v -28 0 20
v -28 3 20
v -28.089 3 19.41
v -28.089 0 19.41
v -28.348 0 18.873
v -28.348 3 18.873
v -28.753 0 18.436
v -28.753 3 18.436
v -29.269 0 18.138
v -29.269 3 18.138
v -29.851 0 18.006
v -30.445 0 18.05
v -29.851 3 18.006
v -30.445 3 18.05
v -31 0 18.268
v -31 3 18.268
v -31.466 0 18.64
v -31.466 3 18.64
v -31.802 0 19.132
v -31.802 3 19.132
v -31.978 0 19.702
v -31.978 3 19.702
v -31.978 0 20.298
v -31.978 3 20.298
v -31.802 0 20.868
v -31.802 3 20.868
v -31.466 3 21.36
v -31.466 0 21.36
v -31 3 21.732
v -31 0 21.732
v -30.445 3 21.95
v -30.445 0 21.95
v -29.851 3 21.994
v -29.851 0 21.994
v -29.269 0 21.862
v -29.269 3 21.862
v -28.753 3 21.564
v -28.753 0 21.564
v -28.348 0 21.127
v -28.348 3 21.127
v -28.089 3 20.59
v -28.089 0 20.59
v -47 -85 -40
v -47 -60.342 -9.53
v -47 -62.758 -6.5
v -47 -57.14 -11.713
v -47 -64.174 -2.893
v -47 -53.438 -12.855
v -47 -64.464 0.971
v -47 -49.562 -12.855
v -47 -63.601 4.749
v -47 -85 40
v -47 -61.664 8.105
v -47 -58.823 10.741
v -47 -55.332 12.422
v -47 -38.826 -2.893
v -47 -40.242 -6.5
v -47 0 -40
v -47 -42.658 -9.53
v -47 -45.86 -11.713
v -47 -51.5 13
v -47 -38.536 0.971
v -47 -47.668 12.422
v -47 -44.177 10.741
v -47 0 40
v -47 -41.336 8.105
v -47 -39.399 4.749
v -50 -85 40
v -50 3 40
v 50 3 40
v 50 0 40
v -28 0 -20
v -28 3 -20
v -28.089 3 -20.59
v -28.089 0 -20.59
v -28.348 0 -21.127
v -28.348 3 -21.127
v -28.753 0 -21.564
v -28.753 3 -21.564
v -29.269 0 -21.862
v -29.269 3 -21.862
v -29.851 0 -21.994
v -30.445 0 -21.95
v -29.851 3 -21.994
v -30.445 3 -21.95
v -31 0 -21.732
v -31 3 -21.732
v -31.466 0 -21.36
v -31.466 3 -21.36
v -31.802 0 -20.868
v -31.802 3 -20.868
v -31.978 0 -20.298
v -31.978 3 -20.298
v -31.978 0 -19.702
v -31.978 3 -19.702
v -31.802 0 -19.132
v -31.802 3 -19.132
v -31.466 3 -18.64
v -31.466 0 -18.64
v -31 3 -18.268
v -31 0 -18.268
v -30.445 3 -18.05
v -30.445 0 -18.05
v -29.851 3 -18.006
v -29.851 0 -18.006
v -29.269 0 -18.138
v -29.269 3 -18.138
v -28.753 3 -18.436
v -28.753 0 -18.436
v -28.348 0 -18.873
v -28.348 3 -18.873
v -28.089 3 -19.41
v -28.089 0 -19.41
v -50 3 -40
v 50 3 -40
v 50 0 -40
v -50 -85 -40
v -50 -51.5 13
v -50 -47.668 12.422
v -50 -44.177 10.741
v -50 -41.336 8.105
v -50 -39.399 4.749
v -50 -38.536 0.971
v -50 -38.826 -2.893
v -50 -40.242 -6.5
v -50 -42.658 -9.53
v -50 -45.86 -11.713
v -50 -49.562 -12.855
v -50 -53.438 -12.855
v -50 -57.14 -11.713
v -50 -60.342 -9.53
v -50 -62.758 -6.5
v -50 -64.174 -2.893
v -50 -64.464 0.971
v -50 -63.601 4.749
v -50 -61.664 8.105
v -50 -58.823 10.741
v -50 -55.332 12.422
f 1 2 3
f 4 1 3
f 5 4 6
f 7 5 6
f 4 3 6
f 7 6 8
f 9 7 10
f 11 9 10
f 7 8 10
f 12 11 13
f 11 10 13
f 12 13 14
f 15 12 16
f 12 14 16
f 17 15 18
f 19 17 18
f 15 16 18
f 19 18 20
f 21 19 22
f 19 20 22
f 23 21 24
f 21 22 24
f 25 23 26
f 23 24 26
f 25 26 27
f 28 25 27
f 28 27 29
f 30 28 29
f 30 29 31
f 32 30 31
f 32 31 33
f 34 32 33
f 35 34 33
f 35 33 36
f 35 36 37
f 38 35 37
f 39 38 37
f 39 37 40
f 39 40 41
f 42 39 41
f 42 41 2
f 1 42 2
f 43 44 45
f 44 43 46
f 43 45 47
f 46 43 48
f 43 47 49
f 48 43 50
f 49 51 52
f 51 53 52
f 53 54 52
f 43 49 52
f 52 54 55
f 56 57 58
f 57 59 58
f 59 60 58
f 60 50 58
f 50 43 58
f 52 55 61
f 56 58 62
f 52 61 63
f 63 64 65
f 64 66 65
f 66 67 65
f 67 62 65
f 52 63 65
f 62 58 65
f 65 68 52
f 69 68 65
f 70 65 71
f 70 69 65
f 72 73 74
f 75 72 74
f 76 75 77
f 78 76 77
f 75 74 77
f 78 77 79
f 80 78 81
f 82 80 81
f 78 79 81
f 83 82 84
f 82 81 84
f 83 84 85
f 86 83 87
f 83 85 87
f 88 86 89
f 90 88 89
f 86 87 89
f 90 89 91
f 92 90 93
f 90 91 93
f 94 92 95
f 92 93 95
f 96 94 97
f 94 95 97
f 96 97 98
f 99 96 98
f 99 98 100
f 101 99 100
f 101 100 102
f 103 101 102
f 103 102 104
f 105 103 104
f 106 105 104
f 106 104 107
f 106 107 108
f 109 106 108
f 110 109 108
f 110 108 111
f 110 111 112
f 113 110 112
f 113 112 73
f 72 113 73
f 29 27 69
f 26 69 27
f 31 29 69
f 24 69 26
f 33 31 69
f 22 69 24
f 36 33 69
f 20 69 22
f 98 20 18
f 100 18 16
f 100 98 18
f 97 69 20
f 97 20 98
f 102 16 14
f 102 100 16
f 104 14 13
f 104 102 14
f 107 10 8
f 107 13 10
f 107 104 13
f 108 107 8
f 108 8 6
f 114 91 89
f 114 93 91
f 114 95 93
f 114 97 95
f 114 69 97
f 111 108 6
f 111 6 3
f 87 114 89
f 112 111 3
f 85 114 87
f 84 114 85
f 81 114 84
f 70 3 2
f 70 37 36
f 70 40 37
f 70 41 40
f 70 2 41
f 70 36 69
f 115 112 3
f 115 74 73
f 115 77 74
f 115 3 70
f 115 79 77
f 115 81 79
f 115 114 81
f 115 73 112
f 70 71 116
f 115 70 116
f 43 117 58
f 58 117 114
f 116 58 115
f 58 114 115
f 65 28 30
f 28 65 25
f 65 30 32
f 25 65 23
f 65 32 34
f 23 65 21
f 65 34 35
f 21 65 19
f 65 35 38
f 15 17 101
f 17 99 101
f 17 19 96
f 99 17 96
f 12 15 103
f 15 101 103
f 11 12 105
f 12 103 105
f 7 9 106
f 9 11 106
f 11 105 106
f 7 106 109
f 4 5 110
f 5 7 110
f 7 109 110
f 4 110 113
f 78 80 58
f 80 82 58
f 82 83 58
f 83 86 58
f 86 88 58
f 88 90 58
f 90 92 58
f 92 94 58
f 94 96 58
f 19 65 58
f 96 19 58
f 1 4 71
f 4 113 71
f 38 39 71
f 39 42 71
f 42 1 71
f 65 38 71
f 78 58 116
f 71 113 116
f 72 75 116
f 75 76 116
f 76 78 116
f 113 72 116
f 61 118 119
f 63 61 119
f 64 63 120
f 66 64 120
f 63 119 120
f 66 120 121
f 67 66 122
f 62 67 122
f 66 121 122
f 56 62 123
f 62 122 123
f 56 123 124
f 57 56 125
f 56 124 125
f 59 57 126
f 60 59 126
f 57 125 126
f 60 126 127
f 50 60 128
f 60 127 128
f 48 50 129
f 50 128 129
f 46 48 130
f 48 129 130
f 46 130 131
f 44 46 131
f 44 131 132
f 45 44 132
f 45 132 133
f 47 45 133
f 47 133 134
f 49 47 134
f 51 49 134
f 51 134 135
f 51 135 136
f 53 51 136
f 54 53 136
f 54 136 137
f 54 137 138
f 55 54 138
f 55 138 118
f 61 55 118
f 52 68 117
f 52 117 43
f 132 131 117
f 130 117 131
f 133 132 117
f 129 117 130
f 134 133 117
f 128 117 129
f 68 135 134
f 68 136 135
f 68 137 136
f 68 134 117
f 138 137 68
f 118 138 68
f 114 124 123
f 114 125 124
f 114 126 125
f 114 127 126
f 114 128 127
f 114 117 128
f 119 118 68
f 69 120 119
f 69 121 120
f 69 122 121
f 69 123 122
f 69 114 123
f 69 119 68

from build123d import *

# Parameters (mm, degrees)
SKETCH2_W           = 100
SKETCH2_H           = 80
BOSS_EXTRUDE1_DEPTH = 3
SKETCH3_W           = 3
SKETCH3_H           = 80
BOSS_EXTRUDE2_DEPTH = 100
SKETCH8_R           = 2
CUT_EXTRUDE3_DEPTH  = 61
SKETCH6_R           = 13
CUT_EXTRUDE4_DEPTH  = 10
SKETCH9_W           = 3
SKETCH9_H           = 80
CUT_EXTRUDE5_DEPTH  = 15


with BuildPart() as part:
    # Sketch2 → Boss-Extrude1 (new body)
    with BuildSketch(Plane(origin=(0, 0, 0), x_dir=(1, 0, 0), z_dir=(0, 1, 0))):
        Rectangle(SKETCH2_W, SKETCH2_H)
    extrude(amount=BOSS_EXTRUDE1_DEPTH)

    # Sketch3 → Boss-Extrude2 (add)
    with BuildSketch(Plane.XZ):
        with Locations((-48.5, 0)):
            Rectangle(SKETCH3_W, SKETCH3_H)
    extrude(amount=BOSS_EXTRUDE2_DEPTH)

    # Sketch8 → Cut-Extrude3 (cut)
    with BuildSketch(Plane(origin=(0, 3, 0), x_dir=(1, 0, 0), z_dir=(0, 1, 0))):
        with Locations((-30, 20)):
            Circle(SKETCH8_R)
        with Locations((-30, -20)):
            Circle(SKETCH8_R)
    extrude(amount=-CUT_EXTRUDE3_DEPTH, mode=Mode.SUBTRACT)

    # Sketch6 → Cut-Extrude4 (cut)
    with BuildSketch(Plane.ZY.offset(50)):
        with Locations((0, -51.5)):
            Circle(SKETCH6_R)
    extrude(amount=-CUT_EXTRUDE4_DEPTH, mode=Mode.SUBTRACT)

    # Sketch9 → Cut-Extrude5 (cut)
    with BuildSketch(Plane.XZ.offset(100)):
        with Locations((-48.5, 0)):
            Rectangle(SKETCH9_W, SKETCH9_H)
    extrude(amount=-CUT_EXTRUDE5_DEPTH, mode=Mode.SUBTRACT)


solid = part.part
